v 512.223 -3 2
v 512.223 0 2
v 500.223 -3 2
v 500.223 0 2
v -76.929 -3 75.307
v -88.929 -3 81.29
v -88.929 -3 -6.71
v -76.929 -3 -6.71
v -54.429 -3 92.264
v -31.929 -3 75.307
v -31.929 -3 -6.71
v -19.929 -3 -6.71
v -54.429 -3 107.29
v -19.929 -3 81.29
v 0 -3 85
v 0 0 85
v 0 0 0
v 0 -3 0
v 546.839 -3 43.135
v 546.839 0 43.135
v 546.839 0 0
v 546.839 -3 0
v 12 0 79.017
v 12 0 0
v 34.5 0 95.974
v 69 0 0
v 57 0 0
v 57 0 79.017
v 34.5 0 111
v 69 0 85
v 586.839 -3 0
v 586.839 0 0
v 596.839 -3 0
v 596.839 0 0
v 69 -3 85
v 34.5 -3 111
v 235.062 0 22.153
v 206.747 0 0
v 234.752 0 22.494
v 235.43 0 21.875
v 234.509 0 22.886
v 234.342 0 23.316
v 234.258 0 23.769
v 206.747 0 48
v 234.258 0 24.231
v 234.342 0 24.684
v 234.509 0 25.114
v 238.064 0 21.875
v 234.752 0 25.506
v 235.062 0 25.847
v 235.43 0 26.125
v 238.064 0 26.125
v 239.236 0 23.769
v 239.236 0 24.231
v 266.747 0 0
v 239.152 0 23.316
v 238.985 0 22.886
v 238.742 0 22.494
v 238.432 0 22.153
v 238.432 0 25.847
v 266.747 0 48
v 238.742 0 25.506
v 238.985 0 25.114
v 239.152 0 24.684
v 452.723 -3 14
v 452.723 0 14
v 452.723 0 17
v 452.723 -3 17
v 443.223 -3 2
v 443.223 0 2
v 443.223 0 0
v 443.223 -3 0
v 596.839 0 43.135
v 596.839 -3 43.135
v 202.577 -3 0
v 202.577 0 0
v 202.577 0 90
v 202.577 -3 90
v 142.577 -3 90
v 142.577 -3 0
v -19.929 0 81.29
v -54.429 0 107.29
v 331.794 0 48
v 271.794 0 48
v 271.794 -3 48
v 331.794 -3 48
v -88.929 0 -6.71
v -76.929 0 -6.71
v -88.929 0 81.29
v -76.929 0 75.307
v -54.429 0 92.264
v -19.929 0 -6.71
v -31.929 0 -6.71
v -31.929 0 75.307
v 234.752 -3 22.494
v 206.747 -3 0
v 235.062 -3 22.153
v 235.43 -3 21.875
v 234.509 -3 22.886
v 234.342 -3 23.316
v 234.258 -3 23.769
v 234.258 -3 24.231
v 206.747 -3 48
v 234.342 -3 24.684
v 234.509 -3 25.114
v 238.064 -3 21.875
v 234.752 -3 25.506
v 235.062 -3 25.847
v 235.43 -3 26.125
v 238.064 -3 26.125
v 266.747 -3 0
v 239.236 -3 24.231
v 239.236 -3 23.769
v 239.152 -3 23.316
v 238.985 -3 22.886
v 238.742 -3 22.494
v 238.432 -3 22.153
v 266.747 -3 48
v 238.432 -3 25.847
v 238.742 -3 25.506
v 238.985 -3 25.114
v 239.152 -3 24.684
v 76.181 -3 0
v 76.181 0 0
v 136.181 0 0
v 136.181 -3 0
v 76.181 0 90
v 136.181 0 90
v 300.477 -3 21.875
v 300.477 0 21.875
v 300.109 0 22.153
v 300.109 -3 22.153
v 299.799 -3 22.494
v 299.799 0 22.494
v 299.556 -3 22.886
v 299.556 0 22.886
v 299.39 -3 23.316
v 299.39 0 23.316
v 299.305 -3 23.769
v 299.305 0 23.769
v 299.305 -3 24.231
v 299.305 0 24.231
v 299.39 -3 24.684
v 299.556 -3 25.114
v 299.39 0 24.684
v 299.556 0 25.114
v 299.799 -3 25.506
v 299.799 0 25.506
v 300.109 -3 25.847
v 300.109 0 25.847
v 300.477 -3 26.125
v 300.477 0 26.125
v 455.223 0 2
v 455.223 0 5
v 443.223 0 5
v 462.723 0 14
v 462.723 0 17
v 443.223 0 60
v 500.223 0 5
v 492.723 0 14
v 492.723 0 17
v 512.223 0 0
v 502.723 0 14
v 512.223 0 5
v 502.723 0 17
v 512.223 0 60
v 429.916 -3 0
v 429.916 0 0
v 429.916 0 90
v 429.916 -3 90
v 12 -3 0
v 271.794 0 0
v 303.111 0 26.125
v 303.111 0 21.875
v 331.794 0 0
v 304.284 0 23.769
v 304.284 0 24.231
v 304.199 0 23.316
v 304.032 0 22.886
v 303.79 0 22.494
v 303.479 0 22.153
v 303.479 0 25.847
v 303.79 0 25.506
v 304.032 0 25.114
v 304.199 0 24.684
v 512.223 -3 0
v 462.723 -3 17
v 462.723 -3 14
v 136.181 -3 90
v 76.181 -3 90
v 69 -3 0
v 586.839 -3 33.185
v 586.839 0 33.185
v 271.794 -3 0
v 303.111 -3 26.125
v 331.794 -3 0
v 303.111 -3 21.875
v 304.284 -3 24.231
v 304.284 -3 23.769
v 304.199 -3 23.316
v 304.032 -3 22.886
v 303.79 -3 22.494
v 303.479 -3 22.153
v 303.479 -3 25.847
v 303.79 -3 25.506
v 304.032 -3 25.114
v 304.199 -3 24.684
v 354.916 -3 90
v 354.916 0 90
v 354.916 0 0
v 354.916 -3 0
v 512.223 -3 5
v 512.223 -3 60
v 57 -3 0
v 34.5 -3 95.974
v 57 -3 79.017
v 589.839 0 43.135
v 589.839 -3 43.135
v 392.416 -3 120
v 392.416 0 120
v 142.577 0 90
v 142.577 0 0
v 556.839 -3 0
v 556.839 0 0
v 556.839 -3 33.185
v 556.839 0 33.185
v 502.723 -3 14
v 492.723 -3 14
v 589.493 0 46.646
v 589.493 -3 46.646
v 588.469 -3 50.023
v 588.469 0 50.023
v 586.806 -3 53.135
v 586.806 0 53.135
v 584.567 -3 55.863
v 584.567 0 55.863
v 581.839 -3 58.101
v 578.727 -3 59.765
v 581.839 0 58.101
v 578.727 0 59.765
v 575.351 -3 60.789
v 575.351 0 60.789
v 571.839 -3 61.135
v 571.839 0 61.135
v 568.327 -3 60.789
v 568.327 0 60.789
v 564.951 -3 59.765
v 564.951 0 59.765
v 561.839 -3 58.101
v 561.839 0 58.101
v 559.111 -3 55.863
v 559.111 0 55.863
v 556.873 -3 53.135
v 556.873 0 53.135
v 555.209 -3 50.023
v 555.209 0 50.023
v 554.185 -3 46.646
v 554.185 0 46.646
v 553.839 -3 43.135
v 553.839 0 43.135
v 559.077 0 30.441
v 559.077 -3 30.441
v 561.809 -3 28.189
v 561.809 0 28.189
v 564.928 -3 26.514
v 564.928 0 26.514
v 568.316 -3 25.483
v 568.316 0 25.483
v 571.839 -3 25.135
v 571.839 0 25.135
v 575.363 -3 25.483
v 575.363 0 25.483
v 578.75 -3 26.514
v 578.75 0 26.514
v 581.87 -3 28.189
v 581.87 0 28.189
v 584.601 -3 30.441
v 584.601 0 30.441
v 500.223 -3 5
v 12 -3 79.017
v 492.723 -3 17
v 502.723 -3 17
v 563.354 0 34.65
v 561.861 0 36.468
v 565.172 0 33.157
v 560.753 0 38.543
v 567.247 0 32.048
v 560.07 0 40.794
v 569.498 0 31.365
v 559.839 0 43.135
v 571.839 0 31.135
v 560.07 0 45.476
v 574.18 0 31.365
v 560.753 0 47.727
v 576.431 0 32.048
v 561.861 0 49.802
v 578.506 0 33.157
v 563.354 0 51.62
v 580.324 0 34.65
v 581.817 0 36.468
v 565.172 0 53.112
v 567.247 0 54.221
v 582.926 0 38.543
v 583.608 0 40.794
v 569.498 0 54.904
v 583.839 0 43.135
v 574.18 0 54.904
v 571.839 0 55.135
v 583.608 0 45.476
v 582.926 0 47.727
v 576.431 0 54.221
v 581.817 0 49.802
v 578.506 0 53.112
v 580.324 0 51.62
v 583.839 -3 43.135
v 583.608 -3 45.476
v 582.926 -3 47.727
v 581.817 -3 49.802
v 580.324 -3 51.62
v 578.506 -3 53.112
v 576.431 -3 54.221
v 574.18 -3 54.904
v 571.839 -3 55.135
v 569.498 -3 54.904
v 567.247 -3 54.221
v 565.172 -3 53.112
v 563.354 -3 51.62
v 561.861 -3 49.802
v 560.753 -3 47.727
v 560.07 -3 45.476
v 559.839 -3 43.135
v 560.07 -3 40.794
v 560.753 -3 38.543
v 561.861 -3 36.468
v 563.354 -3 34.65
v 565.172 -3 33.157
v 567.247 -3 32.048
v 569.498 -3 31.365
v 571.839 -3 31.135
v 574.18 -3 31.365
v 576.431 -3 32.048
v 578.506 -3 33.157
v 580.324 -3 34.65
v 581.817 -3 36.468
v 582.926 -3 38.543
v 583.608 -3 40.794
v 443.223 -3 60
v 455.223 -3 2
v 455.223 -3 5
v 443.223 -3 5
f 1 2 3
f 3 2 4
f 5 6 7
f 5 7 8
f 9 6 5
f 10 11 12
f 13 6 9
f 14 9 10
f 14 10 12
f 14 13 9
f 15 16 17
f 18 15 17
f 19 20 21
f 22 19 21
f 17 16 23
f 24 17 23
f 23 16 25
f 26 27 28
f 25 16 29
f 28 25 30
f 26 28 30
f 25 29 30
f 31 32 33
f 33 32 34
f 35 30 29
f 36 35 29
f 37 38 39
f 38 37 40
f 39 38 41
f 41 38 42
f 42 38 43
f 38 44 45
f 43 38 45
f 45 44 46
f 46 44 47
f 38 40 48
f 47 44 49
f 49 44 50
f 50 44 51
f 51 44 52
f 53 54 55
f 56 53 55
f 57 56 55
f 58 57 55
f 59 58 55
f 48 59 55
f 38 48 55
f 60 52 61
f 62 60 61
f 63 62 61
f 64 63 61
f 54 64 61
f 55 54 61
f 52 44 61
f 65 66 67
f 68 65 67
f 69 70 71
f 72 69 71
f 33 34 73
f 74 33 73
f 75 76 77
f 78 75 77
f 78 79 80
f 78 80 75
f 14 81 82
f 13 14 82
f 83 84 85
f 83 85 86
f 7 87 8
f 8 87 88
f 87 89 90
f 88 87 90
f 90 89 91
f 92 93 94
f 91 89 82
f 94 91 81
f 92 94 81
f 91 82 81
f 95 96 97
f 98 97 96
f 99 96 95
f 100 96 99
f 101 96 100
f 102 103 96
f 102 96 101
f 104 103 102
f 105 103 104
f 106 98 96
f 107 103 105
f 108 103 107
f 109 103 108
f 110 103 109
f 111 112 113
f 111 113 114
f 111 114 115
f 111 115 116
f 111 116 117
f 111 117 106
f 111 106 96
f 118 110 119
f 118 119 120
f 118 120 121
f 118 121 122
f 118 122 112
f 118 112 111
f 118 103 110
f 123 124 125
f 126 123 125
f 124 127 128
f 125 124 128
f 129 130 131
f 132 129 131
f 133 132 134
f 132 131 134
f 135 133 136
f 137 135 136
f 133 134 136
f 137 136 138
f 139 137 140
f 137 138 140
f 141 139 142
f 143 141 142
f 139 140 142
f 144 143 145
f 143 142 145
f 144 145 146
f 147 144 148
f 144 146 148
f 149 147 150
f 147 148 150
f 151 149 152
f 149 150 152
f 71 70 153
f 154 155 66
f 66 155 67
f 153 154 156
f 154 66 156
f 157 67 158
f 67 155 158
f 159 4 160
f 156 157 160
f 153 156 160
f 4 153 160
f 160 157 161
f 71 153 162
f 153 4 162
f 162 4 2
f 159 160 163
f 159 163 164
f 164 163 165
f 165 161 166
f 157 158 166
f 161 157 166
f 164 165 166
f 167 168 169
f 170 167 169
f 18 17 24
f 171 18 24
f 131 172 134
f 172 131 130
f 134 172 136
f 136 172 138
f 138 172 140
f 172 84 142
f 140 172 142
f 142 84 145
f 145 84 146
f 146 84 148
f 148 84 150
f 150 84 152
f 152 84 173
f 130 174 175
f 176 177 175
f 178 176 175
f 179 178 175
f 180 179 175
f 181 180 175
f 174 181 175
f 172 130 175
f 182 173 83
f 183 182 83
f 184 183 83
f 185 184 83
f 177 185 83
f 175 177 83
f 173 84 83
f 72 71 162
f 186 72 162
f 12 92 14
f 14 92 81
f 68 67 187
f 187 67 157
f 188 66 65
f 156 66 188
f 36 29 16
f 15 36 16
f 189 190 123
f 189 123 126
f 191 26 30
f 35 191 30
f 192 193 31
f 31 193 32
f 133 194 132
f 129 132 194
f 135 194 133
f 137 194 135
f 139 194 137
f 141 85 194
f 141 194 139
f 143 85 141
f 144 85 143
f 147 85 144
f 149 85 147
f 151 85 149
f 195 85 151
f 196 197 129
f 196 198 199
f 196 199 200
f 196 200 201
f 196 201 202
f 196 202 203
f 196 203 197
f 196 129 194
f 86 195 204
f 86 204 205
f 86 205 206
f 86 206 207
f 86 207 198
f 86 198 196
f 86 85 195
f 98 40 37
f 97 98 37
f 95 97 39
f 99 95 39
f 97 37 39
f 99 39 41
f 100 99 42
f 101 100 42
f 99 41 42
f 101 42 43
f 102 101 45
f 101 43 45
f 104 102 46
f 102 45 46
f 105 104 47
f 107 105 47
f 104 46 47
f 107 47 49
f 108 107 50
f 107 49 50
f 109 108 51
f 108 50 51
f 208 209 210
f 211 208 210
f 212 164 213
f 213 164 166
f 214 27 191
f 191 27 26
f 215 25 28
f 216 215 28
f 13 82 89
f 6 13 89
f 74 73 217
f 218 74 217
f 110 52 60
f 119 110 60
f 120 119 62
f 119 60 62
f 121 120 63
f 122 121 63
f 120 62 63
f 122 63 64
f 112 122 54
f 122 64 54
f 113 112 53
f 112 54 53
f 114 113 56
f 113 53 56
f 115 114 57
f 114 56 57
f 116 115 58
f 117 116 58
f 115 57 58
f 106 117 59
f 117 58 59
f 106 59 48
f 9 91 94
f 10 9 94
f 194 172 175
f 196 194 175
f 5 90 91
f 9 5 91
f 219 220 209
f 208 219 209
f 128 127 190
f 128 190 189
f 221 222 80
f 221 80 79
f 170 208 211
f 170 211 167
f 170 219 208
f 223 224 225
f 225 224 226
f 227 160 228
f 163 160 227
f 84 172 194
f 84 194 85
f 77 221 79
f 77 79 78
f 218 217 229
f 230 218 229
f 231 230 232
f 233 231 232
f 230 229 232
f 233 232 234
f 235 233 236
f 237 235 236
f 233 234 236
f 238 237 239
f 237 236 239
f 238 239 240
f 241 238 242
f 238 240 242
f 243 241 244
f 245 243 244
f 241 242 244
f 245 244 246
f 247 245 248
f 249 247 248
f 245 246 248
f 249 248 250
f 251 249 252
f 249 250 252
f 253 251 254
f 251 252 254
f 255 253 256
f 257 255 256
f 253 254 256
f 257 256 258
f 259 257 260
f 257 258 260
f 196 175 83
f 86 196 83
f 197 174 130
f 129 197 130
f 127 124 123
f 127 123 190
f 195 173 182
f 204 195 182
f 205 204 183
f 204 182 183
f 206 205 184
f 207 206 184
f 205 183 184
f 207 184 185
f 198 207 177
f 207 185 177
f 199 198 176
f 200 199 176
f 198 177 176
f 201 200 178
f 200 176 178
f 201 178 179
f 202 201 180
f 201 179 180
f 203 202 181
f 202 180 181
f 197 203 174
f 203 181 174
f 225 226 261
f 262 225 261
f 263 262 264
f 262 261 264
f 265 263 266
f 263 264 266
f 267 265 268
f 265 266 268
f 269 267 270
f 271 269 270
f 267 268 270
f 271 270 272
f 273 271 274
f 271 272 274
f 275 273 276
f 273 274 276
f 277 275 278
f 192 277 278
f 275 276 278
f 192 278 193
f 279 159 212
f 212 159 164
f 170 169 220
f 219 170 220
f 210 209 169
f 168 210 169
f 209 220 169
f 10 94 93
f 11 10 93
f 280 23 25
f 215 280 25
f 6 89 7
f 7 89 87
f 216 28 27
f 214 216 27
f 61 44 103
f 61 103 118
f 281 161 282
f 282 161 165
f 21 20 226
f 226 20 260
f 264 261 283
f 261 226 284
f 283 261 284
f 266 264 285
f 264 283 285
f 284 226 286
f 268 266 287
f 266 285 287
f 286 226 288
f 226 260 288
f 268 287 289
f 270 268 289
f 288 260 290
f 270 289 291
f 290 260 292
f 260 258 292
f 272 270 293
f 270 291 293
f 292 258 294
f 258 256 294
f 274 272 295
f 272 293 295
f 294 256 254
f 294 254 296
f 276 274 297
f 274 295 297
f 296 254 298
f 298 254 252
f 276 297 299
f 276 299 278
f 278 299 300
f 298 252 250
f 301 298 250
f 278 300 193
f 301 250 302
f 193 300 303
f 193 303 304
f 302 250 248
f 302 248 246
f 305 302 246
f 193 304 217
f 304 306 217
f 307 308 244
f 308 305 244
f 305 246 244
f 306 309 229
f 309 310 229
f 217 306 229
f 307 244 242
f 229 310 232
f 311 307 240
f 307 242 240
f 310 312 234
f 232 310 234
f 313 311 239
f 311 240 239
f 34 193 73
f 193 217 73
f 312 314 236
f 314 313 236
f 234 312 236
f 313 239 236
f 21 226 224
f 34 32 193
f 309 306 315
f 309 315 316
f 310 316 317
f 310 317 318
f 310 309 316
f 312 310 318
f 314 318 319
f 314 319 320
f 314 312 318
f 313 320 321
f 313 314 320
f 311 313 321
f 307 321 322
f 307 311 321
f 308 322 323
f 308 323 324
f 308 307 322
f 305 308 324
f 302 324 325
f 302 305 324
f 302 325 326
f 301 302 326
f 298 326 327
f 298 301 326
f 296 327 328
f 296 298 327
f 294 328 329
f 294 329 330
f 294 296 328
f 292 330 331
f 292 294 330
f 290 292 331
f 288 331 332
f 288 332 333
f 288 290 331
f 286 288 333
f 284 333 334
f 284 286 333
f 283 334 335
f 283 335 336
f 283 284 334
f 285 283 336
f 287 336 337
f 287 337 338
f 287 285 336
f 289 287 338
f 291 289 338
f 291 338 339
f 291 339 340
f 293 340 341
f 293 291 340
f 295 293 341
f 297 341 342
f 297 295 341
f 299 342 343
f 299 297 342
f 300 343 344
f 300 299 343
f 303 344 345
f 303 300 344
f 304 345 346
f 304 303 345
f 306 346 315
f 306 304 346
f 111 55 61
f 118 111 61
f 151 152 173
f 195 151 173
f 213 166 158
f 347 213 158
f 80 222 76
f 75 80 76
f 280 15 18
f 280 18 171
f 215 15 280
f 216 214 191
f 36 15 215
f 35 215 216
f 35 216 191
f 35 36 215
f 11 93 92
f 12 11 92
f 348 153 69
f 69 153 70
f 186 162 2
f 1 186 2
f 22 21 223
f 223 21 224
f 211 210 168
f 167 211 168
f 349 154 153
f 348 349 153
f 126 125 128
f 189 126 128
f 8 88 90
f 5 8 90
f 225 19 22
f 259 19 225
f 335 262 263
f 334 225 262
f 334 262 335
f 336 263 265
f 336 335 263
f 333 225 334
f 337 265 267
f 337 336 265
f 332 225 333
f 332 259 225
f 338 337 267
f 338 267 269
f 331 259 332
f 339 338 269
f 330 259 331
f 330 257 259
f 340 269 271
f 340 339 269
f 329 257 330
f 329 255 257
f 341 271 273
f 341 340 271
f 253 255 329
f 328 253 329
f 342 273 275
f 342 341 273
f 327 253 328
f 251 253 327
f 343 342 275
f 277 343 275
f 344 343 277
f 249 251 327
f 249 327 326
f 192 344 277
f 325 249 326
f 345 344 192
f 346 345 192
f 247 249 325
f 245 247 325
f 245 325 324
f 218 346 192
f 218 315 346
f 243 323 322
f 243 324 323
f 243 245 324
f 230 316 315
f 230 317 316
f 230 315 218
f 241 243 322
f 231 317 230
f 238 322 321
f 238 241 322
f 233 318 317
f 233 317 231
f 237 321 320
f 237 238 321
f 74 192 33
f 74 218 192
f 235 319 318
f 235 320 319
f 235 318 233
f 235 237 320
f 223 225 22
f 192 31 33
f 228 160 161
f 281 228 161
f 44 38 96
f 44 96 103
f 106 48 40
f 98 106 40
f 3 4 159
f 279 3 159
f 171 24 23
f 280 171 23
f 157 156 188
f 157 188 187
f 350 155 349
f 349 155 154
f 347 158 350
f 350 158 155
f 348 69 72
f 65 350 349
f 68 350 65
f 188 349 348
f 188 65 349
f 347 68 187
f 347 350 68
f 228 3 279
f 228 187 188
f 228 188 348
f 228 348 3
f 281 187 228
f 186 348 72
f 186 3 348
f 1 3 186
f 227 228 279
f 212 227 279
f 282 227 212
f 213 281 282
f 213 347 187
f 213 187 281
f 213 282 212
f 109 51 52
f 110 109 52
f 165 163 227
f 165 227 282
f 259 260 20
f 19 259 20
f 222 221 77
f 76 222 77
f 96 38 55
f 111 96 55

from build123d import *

# Parameters (mm, degrees)
F1_DEPTH = 3
F2_W     = 60
F2_H     = 90
F2_H_2   = 48
F2_W_2   = 10
F2_H_3   = 3
F2_R     = 12
F3_DEPTH = 3


with BuildPart() as f1:
    # F0 (on Front) → F1 (new body)
    with BuildSketch(Plane.XZ):
        Polygon((0, 85), (0, 0), (12, 0), (12, 79.017351), (34.5, 95.973873), (57, 79.017351), (57, 0), (69, 0), (69, 85), (34.5, 111), align=None)
        Polygon((-88.929259, 81.290118), (-88.929259, -3.709882), (-88.929259, -6.709882), (-76.929259, -6.709882), (-76.929259, -4.611619), (-76.929259, -3.709882), (-76.929259, 75.307469), (-54.429259, 92.263991), (-31.929259, 75.307469), (-31.929259, -3.709882), (-31.929259, -6.709882), (-19.929259, -6.709882), (-19.929259, -4.611619), (-19.929259, 81.290118), (-54.429259, 107.290118), align=None)
    extrude(amount=F1_DEPTH)


with BuildPart() as f3:
    # F2 (on Front) → F3 (new body)
    with BuildSketch(Plane.XZ):
        with Locations((106.181309, 45)):
            Rectangle(F2_W, F2_H)
        with Locations((172.576878, 45)):
            Rectangle(F2_W, F2_H)
        with Locations((236.746966, 24)):
            Rectangle(F2_W, F2_H_2)
        with BuildLine():
            ThreePointArc((238.063922, 26.125), (239.246966, 24), (238.063922, 21.875))
            Line((238.063922, 21.875), (235.430009, 21.875))
            ThreePointArc((235.430009, 21.875), (234.246966, 24), (235.430009, 26.125))
            Line((235.430009, 26.125), (238.063922, 26.125))
        make_face(mode=Mode.SUBTRACT)
        with Locations((301.794349, 24)):
            Rectangle(F2_W, F2_H_2)
        with BuildLine():
            ThreePointArc((300.477392, 21.875), (299.294349, 24), (300.477392, 26.125))
            Line((300.477392, 26.125), (303.111306, 26.125))
            ThreePointArc((303.111306, 26.125), (304.294349, 24), (303.111306, 21.875))
            Line((303.111306, 21.875), (300.477392, 21.875))
        make_face(mode=Mode.SUBTRACT)
        Polygon((354.915947, 90), (354.915947, 0), (429.915947, 0), (429.915947, 90), (392.415947, 120), align=None)
        Polygon((443.223119, 2), (443.223119, 0), (512.223119, 0), (512.223119, 2), (500.223119, 2), (500.223119, 5), (512.223119, 5), (512.223119, 60), (443.223119, 60), (443.223119, 5), (455.223119, 5), (455.223119, 2), align=None)
        with Locations((457.723119, 15.5)):
            Rectangle(F2_W_2, F2_H_3, mode=Mode.SUBTRACT)
        with Locations((497.723119, 15.5)):
            Rectangle(F2_W_2, F2_H_3, mode=Mode.SUBTRACT)
        with BuildLine():
            Line((556.839058, 0), (556.839058, 33.184986))
            ThreePointArc((556.839058, 33.184986), (571.839058, 25.134861), (586.839058, 33.184986))
            Line((586.839058, 33.184986), (586.839058, 0))
            Line((586.839058, 0), (596.839058, 0))
            Line((596.839058, 0), (596.839058, 43.134861))
            Line((596.839058, 43.134861), (589.839058, 43.134861))
            ThreePointArc((589.839058, 43.134861), (571.839058, 61.134861), (553.839058, 43.134861))
            Line((553.839058, 43.134861), (546.839058, 43.134861))
            Line((546.839058, 43.134861), (546.839058, 0))
            Line((546.839058, 0), (556.839058, 0))
        make_face()
        with Locations((571.839058, 43.134861)):
            Circle(F2_R, mode=Mode.SUBTRACT)
    extrude(amount=F3_DEPTH)


solid = Compound([f1.part, f3.part])
